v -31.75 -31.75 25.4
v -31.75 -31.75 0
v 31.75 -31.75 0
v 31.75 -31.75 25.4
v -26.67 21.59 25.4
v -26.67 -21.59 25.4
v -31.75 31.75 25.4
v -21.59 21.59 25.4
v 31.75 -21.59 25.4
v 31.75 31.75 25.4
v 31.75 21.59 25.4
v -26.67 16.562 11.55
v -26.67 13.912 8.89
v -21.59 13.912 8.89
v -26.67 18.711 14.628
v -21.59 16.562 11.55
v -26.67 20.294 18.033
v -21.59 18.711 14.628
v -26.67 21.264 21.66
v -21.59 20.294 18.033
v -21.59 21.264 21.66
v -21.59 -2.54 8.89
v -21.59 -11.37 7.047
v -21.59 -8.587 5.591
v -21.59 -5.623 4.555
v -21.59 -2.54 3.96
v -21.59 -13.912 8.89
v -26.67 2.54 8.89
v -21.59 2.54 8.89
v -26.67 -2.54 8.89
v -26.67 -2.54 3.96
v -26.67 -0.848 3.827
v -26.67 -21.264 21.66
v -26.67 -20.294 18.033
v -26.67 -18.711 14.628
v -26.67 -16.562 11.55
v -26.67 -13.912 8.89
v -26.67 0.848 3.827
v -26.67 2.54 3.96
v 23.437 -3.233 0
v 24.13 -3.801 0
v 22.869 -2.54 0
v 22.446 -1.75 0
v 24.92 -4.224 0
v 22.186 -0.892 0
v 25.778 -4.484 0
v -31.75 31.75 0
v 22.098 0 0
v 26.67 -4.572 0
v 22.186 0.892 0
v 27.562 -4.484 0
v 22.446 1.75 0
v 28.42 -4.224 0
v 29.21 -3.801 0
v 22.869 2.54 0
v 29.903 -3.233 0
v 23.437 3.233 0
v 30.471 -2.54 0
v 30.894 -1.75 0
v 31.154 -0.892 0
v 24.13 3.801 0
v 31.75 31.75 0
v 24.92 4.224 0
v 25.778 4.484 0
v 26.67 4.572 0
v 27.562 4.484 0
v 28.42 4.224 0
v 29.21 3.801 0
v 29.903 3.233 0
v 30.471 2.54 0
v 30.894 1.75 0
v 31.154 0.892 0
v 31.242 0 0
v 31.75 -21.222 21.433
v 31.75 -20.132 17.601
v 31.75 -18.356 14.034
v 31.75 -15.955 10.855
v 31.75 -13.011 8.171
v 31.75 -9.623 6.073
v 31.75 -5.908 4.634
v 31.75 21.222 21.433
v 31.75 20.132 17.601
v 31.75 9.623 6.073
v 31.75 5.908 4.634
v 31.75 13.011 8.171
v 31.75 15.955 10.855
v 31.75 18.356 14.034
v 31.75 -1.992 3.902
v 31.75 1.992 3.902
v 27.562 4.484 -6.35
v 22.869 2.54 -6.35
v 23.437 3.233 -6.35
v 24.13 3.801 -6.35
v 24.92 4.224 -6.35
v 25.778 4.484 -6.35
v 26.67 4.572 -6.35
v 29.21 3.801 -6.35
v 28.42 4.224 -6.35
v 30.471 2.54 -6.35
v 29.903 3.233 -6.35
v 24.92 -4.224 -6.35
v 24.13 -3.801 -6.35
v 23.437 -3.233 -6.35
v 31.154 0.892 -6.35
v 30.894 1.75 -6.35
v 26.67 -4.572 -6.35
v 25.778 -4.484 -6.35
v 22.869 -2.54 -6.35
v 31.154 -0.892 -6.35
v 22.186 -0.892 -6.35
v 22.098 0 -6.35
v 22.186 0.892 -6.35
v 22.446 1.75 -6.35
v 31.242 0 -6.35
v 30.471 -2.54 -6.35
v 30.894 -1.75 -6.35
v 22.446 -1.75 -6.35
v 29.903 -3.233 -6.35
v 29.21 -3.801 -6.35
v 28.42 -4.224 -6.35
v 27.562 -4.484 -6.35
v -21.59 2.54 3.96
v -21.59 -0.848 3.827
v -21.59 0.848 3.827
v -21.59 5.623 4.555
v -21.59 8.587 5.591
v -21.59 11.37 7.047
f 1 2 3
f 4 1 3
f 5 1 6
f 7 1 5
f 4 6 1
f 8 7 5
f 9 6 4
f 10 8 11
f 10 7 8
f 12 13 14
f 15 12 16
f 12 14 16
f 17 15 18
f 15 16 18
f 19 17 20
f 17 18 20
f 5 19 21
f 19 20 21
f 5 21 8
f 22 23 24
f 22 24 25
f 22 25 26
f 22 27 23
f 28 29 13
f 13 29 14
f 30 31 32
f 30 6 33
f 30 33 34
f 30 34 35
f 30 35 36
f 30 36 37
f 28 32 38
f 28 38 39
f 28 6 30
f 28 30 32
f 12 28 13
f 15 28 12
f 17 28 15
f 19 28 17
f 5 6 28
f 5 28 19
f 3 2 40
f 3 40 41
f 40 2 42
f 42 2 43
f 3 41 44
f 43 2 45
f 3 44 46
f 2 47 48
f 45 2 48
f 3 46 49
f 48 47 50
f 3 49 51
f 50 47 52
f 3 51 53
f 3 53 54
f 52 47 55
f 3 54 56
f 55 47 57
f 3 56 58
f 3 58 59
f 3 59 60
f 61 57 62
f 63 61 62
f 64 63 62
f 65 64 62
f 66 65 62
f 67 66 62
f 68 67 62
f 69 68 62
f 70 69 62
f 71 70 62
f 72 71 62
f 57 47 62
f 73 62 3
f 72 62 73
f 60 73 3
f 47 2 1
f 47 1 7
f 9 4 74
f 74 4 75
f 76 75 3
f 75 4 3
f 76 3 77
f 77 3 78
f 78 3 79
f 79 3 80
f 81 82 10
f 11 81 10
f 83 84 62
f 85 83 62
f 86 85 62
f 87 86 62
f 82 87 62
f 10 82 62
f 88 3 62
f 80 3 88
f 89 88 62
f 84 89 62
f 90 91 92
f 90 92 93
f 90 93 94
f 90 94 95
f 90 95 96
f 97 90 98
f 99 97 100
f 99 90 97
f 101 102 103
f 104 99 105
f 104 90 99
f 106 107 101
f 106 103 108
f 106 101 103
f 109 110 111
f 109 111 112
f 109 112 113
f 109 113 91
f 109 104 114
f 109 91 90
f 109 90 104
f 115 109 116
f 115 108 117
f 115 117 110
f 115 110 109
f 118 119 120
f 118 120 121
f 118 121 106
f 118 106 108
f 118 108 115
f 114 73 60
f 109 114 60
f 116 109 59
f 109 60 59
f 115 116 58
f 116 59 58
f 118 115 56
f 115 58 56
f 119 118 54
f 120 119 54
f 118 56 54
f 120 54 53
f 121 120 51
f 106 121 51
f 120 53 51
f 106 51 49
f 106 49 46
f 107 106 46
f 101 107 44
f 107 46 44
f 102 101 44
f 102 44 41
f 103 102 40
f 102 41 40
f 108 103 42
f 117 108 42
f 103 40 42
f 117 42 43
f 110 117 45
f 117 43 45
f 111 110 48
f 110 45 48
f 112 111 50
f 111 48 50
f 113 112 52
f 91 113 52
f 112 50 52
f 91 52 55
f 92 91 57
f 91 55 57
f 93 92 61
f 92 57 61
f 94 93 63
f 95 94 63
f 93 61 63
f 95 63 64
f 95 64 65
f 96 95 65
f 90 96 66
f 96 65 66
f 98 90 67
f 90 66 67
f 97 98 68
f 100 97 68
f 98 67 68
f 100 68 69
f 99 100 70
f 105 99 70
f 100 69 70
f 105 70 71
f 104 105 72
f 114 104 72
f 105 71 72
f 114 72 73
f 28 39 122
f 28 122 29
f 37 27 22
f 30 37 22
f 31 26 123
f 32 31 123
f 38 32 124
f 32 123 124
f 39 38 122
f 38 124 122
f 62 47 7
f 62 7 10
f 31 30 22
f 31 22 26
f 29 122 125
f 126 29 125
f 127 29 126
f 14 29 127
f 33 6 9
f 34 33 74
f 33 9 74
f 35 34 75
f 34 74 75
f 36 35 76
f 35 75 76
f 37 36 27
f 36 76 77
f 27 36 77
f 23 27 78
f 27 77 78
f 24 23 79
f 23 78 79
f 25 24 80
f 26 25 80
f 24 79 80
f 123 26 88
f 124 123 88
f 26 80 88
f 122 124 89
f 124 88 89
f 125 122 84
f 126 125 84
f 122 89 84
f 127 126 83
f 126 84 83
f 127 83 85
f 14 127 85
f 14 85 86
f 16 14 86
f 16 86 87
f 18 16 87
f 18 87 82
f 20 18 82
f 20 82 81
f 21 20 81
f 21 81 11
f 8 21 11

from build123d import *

# Parameters (mm, degrees)
F0_W     = 63.5
F0_H     = 63.5
F1_DEPTH = 25.4
F2_R     = 21.59
F3_DEPTH = 53.34
F4_R     = 4.572
F5_DEPTH = 6.35
F7_DEPTH = 5.08
F8_DEPTH = 5.08


with BuildPart() as f1:
    # F0 (on Top) → F1 (new body)
    with BuildSketch(Plane.XY):
        Rectangle(F0_W, F0_H)
    extrude(amount=F1_DEPTH)

    # F2 (on face) → F3 (cut)
    with BuildSketch(Plane.YZ.offset(31.75)):
        with Locations((0, 25.4)):
            Circle(F2_R)
    extrude(amount=-F3_DEPTH, mode=Mode.SUBTRACT)

    # F4 (on face) → F5 (join)
    with BuildSketch(Plane(origin=(0, 0, 0), x_dir=(1, 0, 0), z_dir=(0, 0, -1))):
        with Locations((26.67, 0)):
            Circle(F4_R)
    extrude(amount=F5_DEPTH)

    # F6 (on face) → F7 (cut)
    with BuildSketch(Plane.YZ.offset(-21.59)):
        with BuildLine():
            Line((-2.54, 8.89), (-2.54, 3.9599323695))
            ThreePointArc((-2.54, 3.9599323695), (0, 3.81), (2.54, 3.9599323695))
            Line((2.54, 3.9599323695), (2.54, 8.89))
            Line((2.54, 8.89), (13.9121529606, 8.89))
            ThreePointArc((13.9121529606, 8.89), (0, 46.99), (-13.9121529606, 8.89))
            Line((-13.9121529606, 8.89), (-2.54, 8.89))
        make_face()
    extrude(amount=-F7_DEPTH, mode=Mode.SUBTRACT)

    # F6 (on face) → F8 (cut)
    with BuildSketch(Plane.YZ.offset(-21.59)):
        with BuildLine():
            Line((-2.54, 8.89), (-2.54, 3.9599323695))
            ThreePointArc((-2.54, 3.9599323695), (0, 3.81), (2.54, 3.9599323695))
            Line((2.54, 3.9599323695), (2.54, 8.89))
            Line((2.54, 8.89), (13.9121529606, 8.89))
            ThreePointArc((13.9121529606, 8.89), (0, 46.99), (-13.9121529606, 8.89))
            Line((-13.9121529606, 8.89), (-2.54, 8.89))
        make_face()
    extrude(amount=-F8_DEPTH, mode=Mode.SUBTRACT)


solid = f1.part
